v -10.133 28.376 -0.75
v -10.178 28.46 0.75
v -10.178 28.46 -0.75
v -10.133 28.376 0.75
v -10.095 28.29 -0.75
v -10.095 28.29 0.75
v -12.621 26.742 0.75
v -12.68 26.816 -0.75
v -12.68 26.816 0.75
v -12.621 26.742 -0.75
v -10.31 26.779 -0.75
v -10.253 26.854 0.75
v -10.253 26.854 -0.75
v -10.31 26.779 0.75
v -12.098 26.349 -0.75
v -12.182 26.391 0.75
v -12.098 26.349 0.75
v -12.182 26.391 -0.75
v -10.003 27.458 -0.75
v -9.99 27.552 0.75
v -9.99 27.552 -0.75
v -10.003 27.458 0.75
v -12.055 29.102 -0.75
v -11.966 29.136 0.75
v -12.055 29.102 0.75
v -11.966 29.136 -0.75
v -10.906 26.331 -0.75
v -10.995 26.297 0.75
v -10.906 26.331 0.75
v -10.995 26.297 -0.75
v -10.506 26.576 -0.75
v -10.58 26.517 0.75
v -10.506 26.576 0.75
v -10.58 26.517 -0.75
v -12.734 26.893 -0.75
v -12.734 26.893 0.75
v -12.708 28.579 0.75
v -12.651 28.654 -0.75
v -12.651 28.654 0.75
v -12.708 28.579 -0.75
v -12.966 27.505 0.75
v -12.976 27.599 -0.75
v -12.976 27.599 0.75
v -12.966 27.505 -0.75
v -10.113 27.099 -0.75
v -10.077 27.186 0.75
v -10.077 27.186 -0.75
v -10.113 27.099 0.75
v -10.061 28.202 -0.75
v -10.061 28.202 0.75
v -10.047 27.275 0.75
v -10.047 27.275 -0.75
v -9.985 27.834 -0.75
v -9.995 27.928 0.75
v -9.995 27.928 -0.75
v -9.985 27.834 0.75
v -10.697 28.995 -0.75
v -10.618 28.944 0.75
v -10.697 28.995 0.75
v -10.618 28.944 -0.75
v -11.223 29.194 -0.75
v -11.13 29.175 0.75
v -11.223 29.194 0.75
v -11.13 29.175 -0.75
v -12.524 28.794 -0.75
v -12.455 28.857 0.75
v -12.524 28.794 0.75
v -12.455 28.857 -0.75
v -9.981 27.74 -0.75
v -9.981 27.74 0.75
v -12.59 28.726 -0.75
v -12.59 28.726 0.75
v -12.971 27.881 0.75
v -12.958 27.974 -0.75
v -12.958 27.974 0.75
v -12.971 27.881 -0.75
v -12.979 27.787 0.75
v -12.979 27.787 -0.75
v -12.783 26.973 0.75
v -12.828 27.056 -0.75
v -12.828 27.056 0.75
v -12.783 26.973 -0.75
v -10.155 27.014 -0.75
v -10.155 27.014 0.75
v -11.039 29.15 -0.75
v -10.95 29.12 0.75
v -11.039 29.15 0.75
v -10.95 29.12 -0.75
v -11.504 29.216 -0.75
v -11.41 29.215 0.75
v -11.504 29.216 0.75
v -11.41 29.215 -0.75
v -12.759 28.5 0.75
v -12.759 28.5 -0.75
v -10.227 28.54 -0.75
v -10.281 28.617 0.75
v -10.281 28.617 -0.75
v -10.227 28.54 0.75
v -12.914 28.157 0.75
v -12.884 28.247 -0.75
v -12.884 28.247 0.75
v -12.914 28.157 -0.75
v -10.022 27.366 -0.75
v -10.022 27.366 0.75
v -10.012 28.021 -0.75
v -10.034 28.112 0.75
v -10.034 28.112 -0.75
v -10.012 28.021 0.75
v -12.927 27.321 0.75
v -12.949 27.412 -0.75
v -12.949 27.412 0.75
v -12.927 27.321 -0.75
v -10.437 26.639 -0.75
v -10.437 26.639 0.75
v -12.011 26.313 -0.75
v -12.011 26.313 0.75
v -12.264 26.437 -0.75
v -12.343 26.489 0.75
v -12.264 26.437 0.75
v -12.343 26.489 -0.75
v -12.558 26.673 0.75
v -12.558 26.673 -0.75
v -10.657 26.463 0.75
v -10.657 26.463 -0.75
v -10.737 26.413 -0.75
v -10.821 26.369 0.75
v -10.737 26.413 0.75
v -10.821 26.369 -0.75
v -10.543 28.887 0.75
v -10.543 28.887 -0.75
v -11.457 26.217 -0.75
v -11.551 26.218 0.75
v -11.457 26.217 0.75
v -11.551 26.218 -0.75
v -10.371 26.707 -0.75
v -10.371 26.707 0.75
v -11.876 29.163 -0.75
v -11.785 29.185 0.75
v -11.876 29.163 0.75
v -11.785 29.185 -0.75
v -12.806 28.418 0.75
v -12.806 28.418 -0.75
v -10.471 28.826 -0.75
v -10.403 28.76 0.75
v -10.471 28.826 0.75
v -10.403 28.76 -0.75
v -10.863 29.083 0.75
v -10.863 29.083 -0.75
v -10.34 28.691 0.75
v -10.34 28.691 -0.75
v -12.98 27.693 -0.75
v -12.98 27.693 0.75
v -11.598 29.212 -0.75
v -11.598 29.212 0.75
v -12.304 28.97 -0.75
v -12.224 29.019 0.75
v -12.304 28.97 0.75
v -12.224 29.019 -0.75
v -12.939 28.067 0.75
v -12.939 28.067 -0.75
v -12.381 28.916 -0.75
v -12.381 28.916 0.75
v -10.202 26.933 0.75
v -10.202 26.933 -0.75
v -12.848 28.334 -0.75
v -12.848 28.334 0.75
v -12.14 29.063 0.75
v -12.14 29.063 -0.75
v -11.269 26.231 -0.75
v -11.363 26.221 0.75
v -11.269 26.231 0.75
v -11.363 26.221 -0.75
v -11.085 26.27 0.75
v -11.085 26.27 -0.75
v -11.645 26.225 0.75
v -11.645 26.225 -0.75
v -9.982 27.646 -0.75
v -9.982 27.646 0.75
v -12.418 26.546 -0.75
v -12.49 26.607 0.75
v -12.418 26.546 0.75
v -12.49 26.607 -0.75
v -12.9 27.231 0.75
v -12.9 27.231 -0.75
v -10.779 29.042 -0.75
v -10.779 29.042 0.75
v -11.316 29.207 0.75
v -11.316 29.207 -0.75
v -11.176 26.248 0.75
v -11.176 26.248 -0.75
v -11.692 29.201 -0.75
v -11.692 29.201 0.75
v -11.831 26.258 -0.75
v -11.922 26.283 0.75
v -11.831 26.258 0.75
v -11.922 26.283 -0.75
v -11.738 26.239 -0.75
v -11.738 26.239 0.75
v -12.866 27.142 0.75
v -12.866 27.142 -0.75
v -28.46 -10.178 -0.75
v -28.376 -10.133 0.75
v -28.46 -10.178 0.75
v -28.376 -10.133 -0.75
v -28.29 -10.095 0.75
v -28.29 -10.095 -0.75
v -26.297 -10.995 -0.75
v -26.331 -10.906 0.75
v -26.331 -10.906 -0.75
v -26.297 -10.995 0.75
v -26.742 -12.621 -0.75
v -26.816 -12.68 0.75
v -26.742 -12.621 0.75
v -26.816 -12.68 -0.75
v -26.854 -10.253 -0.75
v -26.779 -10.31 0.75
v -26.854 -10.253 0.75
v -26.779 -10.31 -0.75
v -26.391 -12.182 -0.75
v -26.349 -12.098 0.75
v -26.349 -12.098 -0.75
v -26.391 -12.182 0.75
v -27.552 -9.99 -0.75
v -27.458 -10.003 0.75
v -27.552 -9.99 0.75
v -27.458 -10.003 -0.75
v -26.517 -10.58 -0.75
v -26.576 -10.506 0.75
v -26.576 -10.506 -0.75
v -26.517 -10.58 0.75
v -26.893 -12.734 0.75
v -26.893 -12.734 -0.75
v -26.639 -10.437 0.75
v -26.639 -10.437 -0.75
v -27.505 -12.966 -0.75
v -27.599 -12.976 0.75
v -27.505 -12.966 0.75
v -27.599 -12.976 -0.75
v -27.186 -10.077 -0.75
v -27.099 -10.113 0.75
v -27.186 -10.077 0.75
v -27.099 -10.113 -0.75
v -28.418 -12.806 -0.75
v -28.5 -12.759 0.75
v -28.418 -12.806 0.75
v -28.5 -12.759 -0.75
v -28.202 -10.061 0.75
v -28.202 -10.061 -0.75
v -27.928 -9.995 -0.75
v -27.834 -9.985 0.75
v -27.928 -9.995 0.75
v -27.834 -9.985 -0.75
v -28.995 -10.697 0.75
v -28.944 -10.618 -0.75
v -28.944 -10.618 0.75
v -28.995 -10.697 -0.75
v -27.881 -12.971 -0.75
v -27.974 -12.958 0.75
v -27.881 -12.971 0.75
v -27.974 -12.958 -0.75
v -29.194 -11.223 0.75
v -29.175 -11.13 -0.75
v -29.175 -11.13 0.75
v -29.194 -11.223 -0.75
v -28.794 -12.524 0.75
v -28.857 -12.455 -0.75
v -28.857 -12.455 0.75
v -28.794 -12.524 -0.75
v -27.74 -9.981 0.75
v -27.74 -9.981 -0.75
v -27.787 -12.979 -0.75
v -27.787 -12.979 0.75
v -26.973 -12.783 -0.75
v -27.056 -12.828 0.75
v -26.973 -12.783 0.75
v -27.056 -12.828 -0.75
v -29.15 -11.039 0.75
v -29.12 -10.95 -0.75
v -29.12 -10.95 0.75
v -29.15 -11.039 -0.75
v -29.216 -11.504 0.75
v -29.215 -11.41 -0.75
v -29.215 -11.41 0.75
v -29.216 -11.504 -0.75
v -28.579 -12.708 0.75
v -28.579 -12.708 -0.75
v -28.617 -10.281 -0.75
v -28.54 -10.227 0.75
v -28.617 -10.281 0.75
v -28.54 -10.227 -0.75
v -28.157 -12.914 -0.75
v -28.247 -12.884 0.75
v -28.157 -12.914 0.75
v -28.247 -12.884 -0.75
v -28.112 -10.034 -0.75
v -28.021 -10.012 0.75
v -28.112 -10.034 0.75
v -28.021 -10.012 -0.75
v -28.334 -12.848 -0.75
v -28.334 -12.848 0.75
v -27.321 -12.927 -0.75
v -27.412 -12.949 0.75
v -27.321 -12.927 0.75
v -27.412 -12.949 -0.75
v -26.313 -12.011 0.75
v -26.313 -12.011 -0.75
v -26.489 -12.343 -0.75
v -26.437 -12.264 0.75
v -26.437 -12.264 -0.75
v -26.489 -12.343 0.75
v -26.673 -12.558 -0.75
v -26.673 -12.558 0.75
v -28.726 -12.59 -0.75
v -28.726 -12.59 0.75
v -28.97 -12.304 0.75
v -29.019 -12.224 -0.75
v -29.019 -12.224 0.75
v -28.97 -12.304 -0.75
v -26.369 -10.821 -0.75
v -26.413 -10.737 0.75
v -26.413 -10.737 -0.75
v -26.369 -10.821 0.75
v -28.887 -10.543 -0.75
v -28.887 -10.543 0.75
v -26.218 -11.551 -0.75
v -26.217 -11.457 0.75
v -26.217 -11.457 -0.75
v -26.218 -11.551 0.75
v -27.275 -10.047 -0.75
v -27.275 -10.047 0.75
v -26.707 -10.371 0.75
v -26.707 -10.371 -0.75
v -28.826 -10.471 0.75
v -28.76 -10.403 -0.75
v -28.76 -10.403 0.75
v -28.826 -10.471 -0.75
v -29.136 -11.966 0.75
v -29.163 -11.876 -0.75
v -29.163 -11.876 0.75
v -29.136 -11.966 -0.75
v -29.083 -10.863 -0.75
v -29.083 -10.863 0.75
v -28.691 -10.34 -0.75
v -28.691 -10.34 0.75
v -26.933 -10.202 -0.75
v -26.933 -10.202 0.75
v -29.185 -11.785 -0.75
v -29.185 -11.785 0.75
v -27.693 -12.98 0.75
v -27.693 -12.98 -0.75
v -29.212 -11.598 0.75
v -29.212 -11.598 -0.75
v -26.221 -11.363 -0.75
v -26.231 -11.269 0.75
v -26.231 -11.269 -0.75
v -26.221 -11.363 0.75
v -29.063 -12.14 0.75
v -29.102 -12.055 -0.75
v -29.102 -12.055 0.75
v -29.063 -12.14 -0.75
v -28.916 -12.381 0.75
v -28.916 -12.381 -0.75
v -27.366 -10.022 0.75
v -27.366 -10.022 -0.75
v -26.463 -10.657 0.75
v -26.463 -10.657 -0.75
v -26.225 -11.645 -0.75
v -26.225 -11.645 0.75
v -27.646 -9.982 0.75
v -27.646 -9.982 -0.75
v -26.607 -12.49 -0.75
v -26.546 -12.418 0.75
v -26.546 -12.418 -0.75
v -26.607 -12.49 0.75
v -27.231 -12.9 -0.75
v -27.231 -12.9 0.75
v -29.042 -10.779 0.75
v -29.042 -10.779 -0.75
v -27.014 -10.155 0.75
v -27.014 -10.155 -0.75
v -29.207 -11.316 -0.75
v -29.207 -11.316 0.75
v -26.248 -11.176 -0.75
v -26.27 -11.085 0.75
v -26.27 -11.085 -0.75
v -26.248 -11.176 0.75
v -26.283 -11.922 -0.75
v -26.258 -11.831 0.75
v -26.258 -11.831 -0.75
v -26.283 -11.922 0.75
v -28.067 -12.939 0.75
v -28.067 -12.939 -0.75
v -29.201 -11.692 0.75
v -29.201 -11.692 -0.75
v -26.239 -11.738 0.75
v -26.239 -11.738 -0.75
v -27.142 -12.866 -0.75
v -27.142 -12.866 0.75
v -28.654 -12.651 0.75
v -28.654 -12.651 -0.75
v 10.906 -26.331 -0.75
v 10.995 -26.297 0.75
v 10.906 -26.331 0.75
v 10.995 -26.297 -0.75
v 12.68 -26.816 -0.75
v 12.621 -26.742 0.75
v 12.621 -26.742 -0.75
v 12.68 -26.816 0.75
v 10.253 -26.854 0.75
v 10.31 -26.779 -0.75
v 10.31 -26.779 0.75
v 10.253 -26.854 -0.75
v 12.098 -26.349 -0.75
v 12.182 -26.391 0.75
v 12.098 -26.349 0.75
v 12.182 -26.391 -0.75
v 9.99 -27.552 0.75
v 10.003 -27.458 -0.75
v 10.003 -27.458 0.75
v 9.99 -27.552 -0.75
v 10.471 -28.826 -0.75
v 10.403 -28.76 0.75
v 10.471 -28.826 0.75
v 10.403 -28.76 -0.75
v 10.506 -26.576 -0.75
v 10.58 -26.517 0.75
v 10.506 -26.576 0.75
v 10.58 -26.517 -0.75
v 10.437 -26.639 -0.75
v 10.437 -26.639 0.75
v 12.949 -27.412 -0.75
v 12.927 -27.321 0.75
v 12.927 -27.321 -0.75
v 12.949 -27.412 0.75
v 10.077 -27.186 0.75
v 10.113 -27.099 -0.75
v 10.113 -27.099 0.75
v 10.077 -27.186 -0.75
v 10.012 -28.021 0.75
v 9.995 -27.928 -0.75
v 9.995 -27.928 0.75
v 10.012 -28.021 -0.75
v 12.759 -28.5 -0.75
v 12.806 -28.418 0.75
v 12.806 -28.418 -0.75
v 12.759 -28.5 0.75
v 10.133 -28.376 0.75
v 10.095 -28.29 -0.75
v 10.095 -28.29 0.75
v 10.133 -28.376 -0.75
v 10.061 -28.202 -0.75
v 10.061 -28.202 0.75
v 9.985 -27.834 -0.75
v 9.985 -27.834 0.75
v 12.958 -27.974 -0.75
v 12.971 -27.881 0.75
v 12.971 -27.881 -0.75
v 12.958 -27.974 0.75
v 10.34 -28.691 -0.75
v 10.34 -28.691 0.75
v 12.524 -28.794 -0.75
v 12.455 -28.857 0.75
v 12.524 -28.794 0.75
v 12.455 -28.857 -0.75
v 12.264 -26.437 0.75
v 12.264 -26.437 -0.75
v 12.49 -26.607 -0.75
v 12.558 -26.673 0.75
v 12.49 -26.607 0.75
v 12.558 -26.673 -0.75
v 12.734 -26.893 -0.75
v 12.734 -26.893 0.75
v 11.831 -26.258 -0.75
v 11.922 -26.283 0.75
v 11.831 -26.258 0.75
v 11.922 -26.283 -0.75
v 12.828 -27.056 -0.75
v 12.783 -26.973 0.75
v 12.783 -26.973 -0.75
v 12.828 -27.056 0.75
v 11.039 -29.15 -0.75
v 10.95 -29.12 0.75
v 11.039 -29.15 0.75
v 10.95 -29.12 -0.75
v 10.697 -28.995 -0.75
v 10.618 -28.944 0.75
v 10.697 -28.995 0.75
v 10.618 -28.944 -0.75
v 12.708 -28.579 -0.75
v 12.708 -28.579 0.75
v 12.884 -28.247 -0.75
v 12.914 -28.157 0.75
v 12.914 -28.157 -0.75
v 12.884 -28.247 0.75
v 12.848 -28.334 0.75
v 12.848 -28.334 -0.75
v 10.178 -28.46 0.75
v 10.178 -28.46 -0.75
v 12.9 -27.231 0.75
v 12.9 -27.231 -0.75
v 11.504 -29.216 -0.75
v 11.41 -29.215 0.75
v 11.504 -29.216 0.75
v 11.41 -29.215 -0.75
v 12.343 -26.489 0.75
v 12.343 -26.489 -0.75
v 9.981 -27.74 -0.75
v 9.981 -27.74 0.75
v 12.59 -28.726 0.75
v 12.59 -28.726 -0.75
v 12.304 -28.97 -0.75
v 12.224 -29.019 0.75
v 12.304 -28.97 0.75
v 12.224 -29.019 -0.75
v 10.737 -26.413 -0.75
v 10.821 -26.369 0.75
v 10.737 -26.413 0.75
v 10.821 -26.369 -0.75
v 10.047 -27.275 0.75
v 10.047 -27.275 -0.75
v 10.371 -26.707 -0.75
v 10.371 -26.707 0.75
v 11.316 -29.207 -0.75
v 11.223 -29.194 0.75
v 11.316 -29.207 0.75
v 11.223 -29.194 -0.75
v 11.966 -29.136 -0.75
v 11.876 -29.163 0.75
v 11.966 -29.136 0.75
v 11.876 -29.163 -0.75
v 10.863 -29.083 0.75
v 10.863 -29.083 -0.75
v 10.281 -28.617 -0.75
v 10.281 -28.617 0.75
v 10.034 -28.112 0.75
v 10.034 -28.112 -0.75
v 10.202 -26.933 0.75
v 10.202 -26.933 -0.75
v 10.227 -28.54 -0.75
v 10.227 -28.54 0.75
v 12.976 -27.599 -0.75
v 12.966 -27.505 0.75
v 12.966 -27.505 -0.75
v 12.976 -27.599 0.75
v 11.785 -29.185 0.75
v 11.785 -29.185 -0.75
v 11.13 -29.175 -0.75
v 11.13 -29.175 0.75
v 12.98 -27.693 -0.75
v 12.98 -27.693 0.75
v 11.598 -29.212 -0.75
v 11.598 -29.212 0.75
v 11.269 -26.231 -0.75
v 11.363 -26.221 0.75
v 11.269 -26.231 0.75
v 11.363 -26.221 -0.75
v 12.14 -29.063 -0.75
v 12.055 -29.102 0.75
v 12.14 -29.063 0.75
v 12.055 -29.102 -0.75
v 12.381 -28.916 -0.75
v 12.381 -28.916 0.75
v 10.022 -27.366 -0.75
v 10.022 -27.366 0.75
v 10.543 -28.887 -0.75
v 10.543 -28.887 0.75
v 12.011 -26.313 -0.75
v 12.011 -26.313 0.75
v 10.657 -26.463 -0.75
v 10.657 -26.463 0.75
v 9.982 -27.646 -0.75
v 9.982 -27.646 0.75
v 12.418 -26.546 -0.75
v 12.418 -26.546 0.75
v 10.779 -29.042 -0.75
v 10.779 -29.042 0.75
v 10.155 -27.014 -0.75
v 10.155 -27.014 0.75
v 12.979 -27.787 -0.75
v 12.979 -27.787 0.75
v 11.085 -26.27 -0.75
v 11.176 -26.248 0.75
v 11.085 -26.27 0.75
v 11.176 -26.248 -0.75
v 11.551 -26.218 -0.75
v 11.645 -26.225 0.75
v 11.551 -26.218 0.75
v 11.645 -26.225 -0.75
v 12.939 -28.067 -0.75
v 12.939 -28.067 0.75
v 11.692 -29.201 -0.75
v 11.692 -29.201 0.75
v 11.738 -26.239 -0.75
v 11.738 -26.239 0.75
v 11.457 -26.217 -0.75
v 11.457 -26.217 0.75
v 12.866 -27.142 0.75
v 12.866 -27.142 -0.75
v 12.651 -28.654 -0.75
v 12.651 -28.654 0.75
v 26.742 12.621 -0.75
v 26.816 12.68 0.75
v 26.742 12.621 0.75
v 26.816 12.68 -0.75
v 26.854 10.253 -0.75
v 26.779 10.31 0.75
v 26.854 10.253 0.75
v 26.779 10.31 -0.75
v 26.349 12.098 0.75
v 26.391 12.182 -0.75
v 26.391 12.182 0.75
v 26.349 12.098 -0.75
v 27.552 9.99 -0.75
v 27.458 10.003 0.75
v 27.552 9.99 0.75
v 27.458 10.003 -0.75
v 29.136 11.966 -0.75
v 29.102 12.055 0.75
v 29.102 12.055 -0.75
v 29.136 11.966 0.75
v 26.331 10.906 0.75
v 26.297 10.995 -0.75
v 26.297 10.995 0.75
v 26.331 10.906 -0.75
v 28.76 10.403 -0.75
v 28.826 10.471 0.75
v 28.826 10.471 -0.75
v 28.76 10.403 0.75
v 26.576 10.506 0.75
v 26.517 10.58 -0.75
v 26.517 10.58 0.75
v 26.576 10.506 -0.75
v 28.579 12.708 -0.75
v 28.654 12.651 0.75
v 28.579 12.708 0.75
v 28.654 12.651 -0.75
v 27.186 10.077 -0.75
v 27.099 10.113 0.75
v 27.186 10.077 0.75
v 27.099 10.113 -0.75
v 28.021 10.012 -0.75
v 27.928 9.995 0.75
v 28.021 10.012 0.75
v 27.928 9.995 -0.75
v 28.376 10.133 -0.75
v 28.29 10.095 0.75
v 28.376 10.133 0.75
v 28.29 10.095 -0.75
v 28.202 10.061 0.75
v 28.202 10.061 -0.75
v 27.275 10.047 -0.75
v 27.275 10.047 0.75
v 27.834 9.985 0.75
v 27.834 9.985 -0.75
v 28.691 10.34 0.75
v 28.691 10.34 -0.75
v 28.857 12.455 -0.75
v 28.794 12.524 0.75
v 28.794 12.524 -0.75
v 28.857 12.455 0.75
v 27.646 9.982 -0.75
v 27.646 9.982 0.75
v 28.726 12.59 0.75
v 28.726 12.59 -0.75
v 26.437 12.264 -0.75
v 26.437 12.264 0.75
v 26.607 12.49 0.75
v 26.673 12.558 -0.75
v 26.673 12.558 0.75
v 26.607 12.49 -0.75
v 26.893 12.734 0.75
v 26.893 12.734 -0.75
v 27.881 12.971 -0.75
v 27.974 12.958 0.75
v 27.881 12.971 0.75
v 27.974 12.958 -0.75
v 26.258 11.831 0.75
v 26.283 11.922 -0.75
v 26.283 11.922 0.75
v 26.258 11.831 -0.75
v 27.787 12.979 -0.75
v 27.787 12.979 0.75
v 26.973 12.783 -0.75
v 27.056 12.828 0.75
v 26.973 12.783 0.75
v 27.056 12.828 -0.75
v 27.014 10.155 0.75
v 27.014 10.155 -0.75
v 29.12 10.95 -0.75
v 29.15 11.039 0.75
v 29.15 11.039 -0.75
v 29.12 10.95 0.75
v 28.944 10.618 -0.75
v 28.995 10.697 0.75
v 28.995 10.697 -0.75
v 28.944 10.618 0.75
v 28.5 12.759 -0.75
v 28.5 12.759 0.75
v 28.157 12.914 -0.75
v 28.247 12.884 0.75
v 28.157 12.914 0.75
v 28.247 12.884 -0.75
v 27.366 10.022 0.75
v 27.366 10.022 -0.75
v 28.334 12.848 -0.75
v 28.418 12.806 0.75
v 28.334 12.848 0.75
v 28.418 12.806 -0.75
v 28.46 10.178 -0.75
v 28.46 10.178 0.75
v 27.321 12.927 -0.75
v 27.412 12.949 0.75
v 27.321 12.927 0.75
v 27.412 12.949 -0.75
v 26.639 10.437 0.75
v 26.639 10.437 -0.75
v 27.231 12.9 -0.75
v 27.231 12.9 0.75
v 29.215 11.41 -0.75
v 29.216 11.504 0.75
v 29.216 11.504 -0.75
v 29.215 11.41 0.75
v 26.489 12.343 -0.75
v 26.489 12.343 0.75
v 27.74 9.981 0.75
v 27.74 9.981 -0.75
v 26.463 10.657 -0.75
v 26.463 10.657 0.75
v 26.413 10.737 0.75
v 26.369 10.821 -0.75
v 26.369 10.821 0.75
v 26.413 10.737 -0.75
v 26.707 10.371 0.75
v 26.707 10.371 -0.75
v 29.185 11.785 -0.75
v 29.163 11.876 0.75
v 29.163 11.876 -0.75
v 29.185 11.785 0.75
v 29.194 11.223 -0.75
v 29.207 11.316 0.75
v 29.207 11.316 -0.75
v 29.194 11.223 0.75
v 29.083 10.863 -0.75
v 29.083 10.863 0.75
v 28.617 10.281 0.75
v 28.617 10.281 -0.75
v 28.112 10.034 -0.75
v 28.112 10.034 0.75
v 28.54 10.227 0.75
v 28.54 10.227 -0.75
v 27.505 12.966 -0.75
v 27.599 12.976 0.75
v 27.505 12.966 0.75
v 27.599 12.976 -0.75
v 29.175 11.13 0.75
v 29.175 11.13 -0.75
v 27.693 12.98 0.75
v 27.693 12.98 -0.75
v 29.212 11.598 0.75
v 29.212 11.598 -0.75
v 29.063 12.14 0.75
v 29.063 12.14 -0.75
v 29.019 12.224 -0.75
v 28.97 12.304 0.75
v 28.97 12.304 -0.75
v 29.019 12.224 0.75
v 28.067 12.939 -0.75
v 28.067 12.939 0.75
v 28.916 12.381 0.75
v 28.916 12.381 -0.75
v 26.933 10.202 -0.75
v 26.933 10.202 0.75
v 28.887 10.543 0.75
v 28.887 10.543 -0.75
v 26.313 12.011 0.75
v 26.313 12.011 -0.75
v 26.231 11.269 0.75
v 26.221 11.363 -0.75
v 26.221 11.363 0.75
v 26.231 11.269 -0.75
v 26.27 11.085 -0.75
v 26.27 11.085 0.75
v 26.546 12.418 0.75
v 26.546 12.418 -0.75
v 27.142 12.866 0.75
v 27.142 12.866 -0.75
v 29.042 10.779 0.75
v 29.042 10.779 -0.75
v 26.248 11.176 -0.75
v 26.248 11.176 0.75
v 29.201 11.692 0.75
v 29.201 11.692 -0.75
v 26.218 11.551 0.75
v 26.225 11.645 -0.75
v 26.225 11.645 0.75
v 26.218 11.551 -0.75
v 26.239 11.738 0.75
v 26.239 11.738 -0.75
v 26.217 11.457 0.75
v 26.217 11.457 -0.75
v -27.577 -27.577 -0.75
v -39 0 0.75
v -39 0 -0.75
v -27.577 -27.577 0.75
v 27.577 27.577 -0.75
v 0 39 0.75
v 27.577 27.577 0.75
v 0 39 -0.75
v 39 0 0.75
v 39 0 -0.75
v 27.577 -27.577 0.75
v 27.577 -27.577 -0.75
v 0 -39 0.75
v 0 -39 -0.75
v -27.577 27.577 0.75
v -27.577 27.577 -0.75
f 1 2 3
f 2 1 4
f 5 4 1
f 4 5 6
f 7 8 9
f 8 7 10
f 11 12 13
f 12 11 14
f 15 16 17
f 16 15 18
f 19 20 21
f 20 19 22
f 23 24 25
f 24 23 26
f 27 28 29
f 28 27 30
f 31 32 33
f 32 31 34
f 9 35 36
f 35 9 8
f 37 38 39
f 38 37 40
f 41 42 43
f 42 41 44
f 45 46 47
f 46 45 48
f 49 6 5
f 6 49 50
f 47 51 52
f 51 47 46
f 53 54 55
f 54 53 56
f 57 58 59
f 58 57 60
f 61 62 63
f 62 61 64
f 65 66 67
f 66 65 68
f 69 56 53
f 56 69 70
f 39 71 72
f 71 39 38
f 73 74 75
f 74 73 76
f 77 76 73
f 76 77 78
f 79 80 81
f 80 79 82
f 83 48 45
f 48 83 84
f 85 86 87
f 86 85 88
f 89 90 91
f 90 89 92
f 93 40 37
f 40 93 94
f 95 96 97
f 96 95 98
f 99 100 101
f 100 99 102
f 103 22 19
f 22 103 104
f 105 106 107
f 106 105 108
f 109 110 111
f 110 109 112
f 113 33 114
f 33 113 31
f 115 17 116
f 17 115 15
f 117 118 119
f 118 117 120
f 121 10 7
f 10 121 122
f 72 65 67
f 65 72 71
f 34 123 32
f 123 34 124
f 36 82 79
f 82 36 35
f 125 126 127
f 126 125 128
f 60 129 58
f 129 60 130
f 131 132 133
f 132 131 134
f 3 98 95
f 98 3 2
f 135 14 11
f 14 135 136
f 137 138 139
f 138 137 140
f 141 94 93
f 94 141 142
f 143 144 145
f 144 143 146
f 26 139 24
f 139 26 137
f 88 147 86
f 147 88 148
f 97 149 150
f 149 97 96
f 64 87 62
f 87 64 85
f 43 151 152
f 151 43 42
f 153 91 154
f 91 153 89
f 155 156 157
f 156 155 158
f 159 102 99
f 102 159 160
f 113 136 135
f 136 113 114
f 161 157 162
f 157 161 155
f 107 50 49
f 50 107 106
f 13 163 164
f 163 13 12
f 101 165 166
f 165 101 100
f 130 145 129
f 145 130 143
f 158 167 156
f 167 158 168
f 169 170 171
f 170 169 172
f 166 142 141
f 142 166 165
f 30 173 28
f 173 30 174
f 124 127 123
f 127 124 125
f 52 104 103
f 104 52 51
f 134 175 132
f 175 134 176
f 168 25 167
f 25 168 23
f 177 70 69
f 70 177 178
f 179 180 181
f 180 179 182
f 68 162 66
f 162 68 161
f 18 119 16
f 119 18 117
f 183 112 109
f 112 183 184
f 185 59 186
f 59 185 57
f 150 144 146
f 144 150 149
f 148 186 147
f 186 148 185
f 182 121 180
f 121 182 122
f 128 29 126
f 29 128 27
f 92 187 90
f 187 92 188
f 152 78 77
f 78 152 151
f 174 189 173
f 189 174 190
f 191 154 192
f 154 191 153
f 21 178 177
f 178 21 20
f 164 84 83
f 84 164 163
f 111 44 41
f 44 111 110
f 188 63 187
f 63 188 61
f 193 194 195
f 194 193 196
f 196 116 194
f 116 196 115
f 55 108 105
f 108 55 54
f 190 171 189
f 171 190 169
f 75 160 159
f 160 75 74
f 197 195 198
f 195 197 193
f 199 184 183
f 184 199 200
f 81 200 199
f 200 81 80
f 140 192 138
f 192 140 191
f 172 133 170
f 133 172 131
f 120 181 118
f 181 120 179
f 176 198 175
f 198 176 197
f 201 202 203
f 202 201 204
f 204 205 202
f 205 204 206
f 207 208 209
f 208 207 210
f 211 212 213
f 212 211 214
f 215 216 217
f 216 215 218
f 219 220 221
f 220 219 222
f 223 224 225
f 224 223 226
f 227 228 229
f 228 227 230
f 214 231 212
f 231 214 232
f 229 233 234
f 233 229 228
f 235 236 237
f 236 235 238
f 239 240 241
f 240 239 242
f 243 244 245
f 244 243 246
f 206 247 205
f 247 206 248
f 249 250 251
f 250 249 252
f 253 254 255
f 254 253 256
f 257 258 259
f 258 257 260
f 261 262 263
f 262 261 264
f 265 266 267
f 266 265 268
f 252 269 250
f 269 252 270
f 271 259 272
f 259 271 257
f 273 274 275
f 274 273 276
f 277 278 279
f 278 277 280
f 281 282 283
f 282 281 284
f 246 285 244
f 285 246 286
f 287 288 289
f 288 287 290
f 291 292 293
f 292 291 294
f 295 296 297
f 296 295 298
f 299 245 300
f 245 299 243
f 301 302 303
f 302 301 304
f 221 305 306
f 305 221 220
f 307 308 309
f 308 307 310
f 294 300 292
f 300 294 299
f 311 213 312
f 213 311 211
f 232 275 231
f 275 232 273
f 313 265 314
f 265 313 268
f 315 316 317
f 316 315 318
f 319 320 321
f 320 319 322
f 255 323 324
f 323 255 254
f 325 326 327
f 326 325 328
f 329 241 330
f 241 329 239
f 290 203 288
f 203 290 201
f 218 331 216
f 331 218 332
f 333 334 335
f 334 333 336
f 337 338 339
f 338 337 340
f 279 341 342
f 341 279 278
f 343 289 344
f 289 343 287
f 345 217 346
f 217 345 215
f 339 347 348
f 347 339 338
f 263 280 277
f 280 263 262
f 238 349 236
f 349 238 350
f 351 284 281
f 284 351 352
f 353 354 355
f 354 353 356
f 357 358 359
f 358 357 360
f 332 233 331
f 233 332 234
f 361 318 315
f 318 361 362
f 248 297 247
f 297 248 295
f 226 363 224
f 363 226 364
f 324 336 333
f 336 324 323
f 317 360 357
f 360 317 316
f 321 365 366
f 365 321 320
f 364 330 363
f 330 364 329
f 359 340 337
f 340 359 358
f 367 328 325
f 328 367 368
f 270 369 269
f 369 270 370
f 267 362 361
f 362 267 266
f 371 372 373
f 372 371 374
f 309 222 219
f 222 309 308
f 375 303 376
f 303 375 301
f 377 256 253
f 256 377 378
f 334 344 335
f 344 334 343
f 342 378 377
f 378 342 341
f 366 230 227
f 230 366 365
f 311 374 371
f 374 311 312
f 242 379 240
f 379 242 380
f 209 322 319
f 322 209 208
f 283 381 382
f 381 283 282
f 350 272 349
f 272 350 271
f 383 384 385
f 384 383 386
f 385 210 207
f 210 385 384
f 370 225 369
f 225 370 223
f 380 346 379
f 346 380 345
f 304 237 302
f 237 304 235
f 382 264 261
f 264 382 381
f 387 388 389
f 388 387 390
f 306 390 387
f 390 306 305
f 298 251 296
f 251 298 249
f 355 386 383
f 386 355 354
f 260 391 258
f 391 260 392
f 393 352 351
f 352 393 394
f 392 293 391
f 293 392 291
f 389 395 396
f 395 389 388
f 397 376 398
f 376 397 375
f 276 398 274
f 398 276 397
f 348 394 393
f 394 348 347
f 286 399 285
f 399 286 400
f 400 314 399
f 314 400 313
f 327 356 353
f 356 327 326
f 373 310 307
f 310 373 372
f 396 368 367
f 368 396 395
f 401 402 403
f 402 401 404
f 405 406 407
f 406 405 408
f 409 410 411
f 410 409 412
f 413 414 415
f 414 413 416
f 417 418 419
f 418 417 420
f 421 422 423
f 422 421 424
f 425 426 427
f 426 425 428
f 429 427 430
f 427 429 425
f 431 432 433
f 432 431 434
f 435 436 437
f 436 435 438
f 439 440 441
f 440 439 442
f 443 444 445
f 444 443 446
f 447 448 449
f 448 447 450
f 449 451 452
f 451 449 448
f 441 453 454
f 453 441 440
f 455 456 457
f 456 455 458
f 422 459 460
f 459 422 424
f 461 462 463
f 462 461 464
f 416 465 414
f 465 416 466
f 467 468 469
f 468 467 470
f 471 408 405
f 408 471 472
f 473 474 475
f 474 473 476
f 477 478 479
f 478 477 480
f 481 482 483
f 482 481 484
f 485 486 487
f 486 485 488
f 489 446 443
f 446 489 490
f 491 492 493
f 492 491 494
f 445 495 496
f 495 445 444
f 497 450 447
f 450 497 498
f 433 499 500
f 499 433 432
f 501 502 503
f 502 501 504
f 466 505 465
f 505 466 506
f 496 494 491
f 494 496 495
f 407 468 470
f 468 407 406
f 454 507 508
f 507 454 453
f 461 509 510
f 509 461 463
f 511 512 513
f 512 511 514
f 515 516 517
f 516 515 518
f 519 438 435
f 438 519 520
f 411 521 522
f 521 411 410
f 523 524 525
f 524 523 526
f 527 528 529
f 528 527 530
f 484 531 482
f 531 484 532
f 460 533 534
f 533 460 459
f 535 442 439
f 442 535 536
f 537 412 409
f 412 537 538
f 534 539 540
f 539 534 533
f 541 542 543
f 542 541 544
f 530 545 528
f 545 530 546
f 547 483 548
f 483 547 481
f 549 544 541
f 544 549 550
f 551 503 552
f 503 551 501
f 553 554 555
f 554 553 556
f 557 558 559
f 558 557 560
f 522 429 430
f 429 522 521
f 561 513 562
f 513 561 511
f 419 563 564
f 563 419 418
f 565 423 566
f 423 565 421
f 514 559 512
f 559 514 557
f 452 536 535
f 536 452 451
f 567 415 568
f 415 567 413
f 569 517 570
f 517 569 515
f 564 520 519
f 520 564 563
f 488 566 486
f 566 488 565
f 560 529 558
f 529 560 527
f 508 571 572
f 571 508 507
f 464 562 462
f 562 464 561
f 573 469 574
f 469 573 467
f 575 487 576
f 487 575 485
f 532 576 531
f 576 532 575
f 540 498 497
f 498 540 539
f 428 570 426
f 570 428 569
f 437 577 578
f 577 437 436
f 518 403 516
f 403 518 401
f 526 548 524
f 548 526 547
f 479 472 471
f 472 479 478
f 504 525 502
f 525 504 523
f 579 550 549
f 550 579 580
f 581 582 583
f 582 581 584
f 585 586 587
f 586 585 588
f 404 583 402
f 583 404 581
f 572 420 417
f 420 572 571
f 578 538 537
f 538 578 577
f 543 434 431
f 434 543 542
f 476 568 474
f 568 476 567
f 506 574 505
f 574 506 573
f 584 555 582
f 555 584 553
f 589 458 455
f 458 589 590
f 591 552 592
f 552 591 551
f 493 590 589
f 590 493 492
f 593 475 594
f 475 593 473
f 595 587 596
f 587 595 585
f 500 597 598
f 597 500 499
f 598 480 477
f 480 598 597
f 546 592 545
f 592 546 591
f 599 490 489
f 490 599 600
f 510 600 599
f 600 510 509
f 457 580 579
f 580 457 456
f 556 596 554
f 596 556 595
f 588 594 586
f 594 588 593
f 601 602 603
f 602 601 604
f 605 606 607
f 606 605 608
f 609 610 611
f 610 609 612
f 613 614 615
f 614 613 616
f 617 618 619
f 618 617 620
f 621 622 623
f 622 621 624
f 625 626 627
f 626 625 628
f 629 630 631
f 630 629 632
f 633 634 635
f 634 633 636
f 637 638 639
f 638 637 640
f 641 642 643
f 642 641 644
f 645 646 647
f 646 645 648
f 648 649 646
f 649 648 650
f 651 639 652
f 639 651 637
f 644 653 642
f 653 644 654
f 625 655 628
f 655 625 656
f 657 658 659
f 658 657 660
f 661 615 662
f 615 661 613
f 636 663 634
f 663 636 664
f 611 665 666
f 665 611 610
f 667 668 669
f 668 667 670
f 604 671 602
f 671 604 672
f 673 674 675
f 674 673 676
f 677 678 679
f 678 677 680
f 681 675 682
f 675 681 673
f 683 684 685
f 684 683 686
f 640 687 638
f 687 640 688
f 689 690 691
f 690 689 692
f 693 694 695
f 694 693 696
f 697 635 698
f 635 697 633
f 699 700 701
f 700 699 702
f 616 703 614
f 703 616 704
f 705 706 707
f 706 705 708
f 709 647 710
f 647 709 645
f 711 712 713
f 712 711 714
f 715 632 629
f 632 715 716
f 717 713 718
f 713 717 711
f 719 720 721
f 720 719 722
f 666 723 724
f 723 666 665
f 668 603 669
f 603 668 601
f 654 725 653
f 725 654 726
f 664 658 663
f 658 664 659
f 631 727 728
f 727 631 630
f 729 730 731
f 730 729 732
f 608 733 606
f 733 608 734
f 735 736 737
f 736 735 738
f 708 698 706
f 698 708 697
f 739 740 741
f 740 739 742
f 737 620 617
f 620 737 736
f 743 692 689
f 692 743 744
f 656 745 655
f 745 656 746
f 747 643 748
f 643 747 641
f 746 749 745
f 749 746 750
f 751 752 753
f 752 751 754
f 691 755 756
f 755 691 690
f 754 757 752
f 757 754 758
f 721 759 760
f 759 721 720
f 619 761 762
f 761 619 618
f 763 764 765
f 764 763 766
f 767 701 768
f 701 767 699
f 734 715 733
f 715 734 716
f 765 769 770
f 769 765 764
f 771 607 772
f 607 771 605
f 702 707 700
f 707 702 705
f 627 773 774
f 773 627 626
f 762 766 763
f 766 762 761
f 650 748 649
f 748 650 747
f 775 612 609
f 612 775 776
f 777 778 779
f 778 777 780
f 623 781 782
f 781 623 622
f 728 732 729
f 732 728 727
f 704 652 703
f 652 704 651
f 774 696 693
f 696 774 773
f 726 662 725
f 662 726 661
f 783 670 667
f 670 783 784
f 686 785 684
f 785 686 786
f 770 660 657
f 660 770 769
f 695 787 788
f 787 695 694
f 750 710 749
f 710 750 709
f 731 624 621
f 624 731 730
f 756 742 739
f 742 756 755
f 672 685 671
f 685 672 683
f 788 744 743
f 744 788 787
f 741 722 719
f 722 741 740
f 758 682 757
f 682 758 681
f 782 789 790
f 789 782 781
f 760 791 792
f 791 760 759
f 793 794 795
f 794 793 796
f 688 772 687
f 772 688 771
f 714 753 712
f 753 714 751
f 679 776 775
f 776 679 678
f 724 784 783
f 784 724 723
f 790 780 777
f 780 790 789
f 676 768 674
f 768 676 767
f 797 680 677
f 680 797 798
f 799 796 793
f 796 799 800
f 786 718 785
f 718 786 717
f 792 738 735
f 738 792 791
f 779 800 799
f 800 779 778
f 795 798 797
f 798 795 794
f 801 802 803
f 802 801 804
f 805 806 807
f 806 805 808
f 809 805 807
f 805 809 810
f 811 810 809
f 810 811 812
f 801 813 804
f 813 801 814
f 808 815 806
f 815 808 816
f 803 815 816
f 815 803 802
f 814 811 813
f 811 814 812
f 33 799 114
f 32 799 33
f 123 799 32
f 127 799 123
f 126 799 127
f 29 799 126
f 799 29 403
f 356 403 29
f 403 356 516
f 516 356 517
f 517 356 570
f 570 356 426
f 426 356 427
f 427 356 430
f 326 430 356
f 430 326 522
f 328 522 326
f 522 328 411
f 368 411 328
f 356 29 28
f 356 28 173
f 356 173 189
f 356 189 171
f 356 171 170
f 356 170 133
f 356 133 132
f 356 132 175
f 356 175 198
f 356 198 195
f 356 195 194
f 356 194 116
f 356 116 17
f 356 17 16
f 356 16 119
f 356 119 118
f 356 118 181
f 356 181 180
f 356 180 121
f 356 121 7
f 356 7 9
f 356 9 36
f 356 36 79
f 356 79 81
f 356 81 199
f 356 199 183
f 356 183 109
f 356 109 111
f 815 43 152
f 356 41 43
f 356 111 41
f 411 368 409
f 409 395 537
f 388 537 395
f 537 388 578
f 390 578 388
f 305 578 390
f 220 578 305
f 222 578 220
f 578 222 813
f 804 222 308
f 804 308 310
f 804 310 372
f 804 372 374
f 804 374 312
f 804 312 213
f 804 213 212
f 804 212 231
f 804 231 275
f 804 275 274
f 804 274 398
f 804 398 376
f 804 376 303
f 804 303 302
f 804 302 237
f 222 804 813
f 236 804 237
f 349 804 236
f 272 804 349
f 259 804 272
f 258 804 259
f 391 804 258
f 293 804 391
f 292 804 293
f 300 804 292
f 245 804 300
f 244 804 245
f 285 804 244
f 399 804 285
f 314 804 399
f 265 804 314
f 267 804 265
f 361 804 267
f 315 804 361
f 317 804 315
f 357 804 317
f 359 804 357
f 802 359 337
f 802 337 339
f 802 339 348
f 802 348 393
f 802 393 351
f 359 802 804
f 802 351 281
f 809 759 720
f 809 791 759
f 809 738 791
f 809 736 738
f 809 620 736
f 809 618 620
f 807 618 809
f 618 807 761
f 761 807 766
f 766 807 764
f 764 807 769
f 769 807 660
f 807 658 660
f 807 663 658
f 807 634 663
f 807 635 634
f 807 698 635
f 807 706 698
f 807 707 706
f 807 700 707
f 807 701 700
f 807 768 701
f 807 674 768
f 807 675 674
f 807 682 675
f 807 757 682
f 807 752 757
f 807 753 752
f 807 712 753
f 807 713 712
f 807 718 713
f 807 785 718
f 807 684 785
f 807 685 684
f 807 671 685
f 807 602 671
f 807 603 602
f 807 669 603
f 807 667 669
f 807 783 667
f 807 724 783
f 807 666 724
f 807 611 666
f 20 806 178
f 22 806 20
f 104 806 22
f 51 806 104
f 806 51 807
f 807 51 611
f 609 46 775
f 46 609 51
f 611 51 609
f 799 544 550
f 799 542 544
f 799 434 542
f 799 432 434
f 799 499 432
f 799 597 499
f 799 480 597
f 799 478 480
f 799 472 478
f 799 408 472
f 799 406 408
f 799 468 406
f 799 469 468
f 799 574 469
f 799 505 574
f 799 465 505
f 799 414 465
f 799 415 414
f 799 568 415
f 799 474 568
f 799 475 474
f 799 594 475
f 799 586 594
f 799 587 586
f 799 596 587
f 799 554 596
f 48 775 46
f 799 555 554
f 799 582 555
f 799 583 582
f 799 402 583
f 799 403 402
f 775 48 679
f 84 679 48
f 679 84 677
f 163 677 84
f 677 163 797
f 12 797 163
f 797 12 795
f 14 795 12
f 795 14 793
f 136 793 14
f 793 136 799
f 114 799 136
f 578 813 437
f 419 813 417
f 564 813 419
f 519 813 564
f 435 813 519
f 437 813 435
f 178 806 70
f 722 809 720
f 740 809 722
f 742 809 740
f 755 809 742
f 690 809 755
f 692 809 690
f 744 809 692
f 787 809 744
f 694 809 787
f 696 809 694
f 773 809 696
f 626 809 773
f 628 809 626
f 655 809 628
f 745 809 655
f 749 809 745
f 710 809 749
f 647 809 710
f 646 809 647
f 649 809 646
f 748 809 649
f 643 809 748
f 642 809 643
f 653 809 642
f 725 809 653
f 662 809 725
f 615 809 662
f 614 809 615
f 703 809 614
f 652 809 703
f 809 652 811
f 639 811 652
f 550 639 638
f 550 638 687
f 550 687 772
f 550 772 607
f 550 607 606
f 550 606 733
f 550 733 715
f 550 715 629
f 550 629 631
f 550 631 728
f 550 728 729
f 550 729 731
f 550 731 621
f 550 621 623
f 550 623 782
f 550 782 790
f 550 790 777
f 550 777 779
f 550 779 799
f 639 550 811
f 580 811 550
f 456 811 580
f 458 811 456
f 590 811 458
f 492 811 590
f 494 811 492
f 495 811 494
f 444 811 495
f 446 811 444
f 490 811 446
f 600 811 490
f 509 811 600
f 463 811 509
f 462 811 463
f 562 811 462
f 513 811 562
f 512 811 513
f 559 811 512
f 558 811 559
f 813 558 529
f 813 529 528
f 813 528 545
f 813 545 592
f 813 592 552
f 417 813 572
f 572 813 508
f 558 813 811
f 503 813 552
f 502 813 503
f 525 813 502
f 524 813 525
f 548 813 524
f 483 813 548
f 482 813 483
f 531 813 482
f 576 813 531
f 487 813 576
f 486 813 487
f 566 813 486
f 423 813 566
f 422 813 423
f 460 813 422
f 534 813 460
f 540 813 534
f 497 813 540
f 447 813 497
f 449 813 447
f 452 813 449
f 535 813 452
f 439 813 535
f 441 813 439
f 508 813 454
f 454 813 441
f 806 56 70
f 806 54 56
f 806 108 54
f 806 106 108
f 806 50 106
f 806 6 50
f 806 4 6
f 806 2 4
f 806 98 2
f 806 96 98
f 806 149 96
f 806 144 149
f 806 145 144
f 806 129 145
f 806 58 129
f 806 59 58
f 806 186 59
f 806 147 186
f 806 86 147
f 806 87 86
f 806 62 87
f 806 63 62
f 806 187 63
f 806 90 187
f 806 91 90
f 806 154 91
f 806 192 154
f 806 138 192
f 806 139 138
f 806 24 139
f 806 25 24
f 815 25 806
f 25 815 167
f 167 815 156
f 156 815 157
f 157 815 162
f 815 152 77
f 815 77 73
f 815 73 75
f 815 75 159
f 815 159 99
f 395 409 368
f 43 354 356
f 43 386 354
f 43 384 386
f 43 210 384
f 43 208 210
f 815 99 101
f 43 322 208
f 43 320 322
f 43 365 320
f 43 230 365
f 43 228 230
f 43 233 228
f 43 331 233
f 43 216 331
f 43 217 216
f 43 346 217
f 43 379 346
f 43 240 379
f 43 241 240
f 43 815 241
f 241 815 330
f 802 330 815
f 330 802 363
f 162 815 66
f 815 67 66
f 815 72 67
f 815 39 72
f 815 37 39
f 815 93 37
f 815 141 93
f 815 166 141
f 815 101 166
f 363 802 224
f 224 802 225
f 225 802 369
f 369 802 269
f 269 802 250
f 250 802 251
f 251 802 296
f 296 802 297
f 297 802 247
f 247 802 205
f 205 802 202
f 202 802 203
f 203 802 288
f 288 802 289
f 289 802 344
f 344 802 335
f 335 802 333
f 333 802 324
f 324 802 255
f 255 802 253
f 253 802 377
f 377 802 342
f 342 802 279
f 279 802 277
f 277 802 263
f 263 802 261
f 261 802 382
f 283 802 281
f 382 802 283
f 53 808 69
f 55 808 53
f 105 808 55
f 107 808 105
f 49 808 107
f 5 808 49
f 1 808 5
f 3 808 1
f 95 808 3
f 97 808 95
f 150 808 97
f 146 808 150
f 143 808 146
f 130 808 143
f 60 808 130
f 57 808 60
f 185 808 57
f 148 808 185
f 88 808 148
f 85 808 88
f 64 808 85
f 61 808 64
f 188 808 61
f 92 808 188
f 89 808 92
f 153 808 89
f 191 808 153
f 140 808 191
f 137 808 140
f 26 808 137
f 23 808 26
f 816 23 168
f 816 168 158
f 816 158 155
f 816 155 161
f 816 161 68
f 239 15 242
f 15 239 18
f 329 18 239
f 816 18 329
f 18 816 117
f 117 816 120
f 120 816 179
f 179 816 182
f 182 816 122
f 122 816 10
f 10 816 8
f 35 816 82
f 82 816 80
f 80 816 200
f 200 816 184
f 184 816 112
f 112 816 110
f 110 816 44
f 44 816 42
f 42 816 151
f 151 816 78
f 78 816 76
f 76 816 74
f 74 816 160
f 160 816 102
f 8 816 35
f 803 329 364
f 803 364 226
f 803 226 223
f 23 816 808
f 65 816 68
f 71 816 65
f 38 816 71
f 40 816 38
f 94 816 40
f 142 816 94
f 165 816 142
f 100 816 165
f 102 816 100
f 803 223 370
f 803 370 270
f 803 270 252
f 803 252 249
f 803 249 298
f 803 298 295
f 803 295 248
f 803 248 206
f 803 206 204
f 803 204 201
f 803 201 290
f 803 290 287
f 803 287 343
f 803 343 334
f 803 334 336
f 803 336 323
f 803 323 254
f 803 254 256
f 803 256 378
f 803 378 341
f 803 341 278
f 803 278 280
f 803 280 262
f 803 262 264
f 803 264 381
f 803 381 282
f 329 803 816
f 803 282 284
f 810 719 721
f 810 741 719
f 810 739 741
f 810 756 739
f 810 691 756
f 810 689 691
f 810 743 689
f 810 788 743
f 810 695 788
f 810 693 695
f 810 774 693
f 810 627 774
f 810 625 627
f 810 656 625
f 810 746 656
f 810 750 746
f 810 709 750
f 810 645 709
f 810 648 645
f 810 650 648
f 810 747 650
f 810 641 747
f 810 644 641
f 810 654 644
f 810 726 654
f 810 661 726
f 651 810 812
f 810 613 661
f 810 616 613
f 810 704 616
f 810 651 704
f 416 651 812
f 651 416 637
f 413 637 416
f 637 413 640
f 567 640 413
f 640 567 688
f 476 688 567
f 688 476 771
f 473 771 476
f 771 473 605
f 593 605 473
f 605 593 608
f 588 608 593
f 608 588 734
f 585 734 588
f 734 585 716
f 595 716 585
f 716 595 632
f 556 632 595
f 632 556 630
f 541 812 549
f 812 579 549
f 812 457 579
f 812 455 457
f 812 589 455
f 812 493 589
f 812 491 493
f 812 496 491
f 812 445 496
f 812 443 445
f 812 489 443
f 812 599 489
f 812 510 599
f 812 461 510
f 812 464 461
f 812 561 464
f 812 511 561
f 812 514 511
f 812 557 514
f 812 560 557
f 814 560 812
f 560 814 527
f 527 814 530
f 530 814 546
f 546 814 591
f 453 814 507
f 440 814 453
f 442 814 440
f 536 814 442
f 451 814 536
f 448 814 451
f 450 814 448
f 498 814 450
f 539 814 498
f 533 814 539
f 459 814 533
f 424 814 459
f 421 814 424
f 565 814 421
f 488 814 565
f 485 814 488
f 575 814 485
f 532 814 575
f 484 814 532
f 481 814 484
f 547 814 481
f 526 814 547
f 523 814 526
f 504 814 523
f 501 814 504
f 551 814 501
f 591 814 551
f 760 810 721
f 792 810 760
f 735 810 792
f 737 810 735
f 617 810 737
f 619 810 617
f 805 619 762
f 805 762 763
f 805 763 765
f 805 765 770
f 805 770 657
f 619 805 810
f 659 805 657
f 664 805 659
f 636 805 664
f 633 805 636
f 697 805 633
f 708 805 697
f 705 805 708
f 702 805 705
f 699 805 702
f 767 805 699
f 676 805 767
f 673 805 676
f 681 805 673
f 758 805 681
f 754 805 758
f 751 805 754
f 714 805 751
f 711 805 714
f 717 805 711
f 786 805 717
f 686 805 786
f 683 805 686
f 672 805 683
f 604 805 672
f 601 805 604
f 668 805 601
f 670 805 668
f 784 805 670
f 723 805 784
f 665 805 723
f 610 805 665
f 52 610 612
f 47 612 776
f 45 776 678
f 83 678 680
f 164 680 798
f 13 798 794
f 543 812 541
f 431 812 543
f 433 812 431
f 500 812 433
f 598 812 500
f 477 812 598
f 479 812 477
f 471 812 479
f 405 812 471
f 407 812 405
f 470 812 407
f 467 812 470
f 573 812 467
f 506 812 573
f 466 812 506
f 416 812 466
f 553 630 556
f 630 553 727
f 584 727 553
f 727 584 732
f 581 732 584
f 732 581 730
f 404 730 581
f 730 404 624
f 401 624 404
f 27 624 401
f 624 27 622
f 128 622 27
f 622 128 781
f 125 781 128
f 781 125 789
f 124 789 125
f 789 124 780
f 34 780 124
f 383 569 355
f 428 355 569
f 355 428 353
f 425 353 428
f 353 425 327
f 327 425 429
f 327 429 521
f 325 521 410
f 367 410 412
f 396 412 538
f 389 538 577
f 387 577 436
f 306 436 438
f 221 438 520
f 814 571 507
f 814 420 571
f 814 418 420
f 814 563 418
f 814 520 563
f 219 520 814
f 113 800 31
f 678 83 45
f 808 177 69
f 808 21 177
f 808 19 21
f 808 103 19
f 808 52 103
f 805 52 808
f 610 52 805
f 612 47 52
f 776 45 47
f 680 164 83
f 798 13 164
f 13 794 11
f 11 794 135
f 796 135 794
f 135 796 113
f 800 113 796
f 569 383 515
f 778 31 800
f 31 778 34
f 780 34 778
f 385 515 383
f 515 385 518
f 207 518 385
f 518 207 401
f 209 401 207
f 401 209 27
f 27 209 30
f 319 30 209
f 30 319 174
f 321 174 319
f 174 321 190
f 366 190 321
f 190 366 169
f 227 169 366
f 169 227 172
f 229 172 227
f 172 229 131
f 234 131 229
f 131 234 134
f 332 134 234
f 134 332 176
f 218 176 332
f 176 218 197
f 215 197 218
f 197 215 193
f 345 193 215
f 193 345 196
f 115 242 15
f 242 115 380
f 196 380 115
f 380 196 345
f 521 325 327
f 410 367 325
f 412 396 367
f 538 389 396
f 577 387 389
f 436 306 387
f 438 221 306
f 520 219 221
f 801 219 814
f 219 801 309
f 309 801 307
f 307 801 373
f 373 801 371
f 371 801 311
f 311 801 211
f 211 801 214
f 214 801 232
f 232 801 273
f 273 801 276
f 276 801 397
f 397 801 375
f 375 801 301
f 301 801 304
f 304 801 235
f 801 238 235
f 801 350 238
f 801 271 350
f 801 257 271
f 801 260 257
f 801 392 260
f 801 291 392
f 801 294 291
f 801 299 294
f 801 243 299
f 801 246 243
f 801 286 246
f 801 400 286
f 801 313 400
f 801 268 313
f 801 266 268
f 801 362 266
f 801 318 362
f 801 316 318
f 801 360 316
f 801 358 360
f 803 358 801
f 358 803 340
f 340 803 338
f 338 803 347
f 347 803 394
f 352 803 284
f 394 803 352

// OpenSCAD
radius=78;
hole_distance=60;
drilling_diameter=3;
wall_height=1.5;


difference(){
cylinder(h=wall_height, d=radius, center=true,$fn=8);
 
  drilling_holes(d=drilling_diameter, pitch_circle_diameter=hole_distance, start_angle=45/2);  

}


module drilling_holes(d=2, nr=4,pitch_circle_diameter =10, start_angle=0 ){
    
    angle= 360/nr;
    for (i = [ 0 : (nr-1)  ]) {
        rotate(start_angle+i*angle){
    translate([0,pitch_circle_diameter/2,0]){
     cylinder(h=1000, d=d, center=true,$fn=100);
    }
}
}
}
